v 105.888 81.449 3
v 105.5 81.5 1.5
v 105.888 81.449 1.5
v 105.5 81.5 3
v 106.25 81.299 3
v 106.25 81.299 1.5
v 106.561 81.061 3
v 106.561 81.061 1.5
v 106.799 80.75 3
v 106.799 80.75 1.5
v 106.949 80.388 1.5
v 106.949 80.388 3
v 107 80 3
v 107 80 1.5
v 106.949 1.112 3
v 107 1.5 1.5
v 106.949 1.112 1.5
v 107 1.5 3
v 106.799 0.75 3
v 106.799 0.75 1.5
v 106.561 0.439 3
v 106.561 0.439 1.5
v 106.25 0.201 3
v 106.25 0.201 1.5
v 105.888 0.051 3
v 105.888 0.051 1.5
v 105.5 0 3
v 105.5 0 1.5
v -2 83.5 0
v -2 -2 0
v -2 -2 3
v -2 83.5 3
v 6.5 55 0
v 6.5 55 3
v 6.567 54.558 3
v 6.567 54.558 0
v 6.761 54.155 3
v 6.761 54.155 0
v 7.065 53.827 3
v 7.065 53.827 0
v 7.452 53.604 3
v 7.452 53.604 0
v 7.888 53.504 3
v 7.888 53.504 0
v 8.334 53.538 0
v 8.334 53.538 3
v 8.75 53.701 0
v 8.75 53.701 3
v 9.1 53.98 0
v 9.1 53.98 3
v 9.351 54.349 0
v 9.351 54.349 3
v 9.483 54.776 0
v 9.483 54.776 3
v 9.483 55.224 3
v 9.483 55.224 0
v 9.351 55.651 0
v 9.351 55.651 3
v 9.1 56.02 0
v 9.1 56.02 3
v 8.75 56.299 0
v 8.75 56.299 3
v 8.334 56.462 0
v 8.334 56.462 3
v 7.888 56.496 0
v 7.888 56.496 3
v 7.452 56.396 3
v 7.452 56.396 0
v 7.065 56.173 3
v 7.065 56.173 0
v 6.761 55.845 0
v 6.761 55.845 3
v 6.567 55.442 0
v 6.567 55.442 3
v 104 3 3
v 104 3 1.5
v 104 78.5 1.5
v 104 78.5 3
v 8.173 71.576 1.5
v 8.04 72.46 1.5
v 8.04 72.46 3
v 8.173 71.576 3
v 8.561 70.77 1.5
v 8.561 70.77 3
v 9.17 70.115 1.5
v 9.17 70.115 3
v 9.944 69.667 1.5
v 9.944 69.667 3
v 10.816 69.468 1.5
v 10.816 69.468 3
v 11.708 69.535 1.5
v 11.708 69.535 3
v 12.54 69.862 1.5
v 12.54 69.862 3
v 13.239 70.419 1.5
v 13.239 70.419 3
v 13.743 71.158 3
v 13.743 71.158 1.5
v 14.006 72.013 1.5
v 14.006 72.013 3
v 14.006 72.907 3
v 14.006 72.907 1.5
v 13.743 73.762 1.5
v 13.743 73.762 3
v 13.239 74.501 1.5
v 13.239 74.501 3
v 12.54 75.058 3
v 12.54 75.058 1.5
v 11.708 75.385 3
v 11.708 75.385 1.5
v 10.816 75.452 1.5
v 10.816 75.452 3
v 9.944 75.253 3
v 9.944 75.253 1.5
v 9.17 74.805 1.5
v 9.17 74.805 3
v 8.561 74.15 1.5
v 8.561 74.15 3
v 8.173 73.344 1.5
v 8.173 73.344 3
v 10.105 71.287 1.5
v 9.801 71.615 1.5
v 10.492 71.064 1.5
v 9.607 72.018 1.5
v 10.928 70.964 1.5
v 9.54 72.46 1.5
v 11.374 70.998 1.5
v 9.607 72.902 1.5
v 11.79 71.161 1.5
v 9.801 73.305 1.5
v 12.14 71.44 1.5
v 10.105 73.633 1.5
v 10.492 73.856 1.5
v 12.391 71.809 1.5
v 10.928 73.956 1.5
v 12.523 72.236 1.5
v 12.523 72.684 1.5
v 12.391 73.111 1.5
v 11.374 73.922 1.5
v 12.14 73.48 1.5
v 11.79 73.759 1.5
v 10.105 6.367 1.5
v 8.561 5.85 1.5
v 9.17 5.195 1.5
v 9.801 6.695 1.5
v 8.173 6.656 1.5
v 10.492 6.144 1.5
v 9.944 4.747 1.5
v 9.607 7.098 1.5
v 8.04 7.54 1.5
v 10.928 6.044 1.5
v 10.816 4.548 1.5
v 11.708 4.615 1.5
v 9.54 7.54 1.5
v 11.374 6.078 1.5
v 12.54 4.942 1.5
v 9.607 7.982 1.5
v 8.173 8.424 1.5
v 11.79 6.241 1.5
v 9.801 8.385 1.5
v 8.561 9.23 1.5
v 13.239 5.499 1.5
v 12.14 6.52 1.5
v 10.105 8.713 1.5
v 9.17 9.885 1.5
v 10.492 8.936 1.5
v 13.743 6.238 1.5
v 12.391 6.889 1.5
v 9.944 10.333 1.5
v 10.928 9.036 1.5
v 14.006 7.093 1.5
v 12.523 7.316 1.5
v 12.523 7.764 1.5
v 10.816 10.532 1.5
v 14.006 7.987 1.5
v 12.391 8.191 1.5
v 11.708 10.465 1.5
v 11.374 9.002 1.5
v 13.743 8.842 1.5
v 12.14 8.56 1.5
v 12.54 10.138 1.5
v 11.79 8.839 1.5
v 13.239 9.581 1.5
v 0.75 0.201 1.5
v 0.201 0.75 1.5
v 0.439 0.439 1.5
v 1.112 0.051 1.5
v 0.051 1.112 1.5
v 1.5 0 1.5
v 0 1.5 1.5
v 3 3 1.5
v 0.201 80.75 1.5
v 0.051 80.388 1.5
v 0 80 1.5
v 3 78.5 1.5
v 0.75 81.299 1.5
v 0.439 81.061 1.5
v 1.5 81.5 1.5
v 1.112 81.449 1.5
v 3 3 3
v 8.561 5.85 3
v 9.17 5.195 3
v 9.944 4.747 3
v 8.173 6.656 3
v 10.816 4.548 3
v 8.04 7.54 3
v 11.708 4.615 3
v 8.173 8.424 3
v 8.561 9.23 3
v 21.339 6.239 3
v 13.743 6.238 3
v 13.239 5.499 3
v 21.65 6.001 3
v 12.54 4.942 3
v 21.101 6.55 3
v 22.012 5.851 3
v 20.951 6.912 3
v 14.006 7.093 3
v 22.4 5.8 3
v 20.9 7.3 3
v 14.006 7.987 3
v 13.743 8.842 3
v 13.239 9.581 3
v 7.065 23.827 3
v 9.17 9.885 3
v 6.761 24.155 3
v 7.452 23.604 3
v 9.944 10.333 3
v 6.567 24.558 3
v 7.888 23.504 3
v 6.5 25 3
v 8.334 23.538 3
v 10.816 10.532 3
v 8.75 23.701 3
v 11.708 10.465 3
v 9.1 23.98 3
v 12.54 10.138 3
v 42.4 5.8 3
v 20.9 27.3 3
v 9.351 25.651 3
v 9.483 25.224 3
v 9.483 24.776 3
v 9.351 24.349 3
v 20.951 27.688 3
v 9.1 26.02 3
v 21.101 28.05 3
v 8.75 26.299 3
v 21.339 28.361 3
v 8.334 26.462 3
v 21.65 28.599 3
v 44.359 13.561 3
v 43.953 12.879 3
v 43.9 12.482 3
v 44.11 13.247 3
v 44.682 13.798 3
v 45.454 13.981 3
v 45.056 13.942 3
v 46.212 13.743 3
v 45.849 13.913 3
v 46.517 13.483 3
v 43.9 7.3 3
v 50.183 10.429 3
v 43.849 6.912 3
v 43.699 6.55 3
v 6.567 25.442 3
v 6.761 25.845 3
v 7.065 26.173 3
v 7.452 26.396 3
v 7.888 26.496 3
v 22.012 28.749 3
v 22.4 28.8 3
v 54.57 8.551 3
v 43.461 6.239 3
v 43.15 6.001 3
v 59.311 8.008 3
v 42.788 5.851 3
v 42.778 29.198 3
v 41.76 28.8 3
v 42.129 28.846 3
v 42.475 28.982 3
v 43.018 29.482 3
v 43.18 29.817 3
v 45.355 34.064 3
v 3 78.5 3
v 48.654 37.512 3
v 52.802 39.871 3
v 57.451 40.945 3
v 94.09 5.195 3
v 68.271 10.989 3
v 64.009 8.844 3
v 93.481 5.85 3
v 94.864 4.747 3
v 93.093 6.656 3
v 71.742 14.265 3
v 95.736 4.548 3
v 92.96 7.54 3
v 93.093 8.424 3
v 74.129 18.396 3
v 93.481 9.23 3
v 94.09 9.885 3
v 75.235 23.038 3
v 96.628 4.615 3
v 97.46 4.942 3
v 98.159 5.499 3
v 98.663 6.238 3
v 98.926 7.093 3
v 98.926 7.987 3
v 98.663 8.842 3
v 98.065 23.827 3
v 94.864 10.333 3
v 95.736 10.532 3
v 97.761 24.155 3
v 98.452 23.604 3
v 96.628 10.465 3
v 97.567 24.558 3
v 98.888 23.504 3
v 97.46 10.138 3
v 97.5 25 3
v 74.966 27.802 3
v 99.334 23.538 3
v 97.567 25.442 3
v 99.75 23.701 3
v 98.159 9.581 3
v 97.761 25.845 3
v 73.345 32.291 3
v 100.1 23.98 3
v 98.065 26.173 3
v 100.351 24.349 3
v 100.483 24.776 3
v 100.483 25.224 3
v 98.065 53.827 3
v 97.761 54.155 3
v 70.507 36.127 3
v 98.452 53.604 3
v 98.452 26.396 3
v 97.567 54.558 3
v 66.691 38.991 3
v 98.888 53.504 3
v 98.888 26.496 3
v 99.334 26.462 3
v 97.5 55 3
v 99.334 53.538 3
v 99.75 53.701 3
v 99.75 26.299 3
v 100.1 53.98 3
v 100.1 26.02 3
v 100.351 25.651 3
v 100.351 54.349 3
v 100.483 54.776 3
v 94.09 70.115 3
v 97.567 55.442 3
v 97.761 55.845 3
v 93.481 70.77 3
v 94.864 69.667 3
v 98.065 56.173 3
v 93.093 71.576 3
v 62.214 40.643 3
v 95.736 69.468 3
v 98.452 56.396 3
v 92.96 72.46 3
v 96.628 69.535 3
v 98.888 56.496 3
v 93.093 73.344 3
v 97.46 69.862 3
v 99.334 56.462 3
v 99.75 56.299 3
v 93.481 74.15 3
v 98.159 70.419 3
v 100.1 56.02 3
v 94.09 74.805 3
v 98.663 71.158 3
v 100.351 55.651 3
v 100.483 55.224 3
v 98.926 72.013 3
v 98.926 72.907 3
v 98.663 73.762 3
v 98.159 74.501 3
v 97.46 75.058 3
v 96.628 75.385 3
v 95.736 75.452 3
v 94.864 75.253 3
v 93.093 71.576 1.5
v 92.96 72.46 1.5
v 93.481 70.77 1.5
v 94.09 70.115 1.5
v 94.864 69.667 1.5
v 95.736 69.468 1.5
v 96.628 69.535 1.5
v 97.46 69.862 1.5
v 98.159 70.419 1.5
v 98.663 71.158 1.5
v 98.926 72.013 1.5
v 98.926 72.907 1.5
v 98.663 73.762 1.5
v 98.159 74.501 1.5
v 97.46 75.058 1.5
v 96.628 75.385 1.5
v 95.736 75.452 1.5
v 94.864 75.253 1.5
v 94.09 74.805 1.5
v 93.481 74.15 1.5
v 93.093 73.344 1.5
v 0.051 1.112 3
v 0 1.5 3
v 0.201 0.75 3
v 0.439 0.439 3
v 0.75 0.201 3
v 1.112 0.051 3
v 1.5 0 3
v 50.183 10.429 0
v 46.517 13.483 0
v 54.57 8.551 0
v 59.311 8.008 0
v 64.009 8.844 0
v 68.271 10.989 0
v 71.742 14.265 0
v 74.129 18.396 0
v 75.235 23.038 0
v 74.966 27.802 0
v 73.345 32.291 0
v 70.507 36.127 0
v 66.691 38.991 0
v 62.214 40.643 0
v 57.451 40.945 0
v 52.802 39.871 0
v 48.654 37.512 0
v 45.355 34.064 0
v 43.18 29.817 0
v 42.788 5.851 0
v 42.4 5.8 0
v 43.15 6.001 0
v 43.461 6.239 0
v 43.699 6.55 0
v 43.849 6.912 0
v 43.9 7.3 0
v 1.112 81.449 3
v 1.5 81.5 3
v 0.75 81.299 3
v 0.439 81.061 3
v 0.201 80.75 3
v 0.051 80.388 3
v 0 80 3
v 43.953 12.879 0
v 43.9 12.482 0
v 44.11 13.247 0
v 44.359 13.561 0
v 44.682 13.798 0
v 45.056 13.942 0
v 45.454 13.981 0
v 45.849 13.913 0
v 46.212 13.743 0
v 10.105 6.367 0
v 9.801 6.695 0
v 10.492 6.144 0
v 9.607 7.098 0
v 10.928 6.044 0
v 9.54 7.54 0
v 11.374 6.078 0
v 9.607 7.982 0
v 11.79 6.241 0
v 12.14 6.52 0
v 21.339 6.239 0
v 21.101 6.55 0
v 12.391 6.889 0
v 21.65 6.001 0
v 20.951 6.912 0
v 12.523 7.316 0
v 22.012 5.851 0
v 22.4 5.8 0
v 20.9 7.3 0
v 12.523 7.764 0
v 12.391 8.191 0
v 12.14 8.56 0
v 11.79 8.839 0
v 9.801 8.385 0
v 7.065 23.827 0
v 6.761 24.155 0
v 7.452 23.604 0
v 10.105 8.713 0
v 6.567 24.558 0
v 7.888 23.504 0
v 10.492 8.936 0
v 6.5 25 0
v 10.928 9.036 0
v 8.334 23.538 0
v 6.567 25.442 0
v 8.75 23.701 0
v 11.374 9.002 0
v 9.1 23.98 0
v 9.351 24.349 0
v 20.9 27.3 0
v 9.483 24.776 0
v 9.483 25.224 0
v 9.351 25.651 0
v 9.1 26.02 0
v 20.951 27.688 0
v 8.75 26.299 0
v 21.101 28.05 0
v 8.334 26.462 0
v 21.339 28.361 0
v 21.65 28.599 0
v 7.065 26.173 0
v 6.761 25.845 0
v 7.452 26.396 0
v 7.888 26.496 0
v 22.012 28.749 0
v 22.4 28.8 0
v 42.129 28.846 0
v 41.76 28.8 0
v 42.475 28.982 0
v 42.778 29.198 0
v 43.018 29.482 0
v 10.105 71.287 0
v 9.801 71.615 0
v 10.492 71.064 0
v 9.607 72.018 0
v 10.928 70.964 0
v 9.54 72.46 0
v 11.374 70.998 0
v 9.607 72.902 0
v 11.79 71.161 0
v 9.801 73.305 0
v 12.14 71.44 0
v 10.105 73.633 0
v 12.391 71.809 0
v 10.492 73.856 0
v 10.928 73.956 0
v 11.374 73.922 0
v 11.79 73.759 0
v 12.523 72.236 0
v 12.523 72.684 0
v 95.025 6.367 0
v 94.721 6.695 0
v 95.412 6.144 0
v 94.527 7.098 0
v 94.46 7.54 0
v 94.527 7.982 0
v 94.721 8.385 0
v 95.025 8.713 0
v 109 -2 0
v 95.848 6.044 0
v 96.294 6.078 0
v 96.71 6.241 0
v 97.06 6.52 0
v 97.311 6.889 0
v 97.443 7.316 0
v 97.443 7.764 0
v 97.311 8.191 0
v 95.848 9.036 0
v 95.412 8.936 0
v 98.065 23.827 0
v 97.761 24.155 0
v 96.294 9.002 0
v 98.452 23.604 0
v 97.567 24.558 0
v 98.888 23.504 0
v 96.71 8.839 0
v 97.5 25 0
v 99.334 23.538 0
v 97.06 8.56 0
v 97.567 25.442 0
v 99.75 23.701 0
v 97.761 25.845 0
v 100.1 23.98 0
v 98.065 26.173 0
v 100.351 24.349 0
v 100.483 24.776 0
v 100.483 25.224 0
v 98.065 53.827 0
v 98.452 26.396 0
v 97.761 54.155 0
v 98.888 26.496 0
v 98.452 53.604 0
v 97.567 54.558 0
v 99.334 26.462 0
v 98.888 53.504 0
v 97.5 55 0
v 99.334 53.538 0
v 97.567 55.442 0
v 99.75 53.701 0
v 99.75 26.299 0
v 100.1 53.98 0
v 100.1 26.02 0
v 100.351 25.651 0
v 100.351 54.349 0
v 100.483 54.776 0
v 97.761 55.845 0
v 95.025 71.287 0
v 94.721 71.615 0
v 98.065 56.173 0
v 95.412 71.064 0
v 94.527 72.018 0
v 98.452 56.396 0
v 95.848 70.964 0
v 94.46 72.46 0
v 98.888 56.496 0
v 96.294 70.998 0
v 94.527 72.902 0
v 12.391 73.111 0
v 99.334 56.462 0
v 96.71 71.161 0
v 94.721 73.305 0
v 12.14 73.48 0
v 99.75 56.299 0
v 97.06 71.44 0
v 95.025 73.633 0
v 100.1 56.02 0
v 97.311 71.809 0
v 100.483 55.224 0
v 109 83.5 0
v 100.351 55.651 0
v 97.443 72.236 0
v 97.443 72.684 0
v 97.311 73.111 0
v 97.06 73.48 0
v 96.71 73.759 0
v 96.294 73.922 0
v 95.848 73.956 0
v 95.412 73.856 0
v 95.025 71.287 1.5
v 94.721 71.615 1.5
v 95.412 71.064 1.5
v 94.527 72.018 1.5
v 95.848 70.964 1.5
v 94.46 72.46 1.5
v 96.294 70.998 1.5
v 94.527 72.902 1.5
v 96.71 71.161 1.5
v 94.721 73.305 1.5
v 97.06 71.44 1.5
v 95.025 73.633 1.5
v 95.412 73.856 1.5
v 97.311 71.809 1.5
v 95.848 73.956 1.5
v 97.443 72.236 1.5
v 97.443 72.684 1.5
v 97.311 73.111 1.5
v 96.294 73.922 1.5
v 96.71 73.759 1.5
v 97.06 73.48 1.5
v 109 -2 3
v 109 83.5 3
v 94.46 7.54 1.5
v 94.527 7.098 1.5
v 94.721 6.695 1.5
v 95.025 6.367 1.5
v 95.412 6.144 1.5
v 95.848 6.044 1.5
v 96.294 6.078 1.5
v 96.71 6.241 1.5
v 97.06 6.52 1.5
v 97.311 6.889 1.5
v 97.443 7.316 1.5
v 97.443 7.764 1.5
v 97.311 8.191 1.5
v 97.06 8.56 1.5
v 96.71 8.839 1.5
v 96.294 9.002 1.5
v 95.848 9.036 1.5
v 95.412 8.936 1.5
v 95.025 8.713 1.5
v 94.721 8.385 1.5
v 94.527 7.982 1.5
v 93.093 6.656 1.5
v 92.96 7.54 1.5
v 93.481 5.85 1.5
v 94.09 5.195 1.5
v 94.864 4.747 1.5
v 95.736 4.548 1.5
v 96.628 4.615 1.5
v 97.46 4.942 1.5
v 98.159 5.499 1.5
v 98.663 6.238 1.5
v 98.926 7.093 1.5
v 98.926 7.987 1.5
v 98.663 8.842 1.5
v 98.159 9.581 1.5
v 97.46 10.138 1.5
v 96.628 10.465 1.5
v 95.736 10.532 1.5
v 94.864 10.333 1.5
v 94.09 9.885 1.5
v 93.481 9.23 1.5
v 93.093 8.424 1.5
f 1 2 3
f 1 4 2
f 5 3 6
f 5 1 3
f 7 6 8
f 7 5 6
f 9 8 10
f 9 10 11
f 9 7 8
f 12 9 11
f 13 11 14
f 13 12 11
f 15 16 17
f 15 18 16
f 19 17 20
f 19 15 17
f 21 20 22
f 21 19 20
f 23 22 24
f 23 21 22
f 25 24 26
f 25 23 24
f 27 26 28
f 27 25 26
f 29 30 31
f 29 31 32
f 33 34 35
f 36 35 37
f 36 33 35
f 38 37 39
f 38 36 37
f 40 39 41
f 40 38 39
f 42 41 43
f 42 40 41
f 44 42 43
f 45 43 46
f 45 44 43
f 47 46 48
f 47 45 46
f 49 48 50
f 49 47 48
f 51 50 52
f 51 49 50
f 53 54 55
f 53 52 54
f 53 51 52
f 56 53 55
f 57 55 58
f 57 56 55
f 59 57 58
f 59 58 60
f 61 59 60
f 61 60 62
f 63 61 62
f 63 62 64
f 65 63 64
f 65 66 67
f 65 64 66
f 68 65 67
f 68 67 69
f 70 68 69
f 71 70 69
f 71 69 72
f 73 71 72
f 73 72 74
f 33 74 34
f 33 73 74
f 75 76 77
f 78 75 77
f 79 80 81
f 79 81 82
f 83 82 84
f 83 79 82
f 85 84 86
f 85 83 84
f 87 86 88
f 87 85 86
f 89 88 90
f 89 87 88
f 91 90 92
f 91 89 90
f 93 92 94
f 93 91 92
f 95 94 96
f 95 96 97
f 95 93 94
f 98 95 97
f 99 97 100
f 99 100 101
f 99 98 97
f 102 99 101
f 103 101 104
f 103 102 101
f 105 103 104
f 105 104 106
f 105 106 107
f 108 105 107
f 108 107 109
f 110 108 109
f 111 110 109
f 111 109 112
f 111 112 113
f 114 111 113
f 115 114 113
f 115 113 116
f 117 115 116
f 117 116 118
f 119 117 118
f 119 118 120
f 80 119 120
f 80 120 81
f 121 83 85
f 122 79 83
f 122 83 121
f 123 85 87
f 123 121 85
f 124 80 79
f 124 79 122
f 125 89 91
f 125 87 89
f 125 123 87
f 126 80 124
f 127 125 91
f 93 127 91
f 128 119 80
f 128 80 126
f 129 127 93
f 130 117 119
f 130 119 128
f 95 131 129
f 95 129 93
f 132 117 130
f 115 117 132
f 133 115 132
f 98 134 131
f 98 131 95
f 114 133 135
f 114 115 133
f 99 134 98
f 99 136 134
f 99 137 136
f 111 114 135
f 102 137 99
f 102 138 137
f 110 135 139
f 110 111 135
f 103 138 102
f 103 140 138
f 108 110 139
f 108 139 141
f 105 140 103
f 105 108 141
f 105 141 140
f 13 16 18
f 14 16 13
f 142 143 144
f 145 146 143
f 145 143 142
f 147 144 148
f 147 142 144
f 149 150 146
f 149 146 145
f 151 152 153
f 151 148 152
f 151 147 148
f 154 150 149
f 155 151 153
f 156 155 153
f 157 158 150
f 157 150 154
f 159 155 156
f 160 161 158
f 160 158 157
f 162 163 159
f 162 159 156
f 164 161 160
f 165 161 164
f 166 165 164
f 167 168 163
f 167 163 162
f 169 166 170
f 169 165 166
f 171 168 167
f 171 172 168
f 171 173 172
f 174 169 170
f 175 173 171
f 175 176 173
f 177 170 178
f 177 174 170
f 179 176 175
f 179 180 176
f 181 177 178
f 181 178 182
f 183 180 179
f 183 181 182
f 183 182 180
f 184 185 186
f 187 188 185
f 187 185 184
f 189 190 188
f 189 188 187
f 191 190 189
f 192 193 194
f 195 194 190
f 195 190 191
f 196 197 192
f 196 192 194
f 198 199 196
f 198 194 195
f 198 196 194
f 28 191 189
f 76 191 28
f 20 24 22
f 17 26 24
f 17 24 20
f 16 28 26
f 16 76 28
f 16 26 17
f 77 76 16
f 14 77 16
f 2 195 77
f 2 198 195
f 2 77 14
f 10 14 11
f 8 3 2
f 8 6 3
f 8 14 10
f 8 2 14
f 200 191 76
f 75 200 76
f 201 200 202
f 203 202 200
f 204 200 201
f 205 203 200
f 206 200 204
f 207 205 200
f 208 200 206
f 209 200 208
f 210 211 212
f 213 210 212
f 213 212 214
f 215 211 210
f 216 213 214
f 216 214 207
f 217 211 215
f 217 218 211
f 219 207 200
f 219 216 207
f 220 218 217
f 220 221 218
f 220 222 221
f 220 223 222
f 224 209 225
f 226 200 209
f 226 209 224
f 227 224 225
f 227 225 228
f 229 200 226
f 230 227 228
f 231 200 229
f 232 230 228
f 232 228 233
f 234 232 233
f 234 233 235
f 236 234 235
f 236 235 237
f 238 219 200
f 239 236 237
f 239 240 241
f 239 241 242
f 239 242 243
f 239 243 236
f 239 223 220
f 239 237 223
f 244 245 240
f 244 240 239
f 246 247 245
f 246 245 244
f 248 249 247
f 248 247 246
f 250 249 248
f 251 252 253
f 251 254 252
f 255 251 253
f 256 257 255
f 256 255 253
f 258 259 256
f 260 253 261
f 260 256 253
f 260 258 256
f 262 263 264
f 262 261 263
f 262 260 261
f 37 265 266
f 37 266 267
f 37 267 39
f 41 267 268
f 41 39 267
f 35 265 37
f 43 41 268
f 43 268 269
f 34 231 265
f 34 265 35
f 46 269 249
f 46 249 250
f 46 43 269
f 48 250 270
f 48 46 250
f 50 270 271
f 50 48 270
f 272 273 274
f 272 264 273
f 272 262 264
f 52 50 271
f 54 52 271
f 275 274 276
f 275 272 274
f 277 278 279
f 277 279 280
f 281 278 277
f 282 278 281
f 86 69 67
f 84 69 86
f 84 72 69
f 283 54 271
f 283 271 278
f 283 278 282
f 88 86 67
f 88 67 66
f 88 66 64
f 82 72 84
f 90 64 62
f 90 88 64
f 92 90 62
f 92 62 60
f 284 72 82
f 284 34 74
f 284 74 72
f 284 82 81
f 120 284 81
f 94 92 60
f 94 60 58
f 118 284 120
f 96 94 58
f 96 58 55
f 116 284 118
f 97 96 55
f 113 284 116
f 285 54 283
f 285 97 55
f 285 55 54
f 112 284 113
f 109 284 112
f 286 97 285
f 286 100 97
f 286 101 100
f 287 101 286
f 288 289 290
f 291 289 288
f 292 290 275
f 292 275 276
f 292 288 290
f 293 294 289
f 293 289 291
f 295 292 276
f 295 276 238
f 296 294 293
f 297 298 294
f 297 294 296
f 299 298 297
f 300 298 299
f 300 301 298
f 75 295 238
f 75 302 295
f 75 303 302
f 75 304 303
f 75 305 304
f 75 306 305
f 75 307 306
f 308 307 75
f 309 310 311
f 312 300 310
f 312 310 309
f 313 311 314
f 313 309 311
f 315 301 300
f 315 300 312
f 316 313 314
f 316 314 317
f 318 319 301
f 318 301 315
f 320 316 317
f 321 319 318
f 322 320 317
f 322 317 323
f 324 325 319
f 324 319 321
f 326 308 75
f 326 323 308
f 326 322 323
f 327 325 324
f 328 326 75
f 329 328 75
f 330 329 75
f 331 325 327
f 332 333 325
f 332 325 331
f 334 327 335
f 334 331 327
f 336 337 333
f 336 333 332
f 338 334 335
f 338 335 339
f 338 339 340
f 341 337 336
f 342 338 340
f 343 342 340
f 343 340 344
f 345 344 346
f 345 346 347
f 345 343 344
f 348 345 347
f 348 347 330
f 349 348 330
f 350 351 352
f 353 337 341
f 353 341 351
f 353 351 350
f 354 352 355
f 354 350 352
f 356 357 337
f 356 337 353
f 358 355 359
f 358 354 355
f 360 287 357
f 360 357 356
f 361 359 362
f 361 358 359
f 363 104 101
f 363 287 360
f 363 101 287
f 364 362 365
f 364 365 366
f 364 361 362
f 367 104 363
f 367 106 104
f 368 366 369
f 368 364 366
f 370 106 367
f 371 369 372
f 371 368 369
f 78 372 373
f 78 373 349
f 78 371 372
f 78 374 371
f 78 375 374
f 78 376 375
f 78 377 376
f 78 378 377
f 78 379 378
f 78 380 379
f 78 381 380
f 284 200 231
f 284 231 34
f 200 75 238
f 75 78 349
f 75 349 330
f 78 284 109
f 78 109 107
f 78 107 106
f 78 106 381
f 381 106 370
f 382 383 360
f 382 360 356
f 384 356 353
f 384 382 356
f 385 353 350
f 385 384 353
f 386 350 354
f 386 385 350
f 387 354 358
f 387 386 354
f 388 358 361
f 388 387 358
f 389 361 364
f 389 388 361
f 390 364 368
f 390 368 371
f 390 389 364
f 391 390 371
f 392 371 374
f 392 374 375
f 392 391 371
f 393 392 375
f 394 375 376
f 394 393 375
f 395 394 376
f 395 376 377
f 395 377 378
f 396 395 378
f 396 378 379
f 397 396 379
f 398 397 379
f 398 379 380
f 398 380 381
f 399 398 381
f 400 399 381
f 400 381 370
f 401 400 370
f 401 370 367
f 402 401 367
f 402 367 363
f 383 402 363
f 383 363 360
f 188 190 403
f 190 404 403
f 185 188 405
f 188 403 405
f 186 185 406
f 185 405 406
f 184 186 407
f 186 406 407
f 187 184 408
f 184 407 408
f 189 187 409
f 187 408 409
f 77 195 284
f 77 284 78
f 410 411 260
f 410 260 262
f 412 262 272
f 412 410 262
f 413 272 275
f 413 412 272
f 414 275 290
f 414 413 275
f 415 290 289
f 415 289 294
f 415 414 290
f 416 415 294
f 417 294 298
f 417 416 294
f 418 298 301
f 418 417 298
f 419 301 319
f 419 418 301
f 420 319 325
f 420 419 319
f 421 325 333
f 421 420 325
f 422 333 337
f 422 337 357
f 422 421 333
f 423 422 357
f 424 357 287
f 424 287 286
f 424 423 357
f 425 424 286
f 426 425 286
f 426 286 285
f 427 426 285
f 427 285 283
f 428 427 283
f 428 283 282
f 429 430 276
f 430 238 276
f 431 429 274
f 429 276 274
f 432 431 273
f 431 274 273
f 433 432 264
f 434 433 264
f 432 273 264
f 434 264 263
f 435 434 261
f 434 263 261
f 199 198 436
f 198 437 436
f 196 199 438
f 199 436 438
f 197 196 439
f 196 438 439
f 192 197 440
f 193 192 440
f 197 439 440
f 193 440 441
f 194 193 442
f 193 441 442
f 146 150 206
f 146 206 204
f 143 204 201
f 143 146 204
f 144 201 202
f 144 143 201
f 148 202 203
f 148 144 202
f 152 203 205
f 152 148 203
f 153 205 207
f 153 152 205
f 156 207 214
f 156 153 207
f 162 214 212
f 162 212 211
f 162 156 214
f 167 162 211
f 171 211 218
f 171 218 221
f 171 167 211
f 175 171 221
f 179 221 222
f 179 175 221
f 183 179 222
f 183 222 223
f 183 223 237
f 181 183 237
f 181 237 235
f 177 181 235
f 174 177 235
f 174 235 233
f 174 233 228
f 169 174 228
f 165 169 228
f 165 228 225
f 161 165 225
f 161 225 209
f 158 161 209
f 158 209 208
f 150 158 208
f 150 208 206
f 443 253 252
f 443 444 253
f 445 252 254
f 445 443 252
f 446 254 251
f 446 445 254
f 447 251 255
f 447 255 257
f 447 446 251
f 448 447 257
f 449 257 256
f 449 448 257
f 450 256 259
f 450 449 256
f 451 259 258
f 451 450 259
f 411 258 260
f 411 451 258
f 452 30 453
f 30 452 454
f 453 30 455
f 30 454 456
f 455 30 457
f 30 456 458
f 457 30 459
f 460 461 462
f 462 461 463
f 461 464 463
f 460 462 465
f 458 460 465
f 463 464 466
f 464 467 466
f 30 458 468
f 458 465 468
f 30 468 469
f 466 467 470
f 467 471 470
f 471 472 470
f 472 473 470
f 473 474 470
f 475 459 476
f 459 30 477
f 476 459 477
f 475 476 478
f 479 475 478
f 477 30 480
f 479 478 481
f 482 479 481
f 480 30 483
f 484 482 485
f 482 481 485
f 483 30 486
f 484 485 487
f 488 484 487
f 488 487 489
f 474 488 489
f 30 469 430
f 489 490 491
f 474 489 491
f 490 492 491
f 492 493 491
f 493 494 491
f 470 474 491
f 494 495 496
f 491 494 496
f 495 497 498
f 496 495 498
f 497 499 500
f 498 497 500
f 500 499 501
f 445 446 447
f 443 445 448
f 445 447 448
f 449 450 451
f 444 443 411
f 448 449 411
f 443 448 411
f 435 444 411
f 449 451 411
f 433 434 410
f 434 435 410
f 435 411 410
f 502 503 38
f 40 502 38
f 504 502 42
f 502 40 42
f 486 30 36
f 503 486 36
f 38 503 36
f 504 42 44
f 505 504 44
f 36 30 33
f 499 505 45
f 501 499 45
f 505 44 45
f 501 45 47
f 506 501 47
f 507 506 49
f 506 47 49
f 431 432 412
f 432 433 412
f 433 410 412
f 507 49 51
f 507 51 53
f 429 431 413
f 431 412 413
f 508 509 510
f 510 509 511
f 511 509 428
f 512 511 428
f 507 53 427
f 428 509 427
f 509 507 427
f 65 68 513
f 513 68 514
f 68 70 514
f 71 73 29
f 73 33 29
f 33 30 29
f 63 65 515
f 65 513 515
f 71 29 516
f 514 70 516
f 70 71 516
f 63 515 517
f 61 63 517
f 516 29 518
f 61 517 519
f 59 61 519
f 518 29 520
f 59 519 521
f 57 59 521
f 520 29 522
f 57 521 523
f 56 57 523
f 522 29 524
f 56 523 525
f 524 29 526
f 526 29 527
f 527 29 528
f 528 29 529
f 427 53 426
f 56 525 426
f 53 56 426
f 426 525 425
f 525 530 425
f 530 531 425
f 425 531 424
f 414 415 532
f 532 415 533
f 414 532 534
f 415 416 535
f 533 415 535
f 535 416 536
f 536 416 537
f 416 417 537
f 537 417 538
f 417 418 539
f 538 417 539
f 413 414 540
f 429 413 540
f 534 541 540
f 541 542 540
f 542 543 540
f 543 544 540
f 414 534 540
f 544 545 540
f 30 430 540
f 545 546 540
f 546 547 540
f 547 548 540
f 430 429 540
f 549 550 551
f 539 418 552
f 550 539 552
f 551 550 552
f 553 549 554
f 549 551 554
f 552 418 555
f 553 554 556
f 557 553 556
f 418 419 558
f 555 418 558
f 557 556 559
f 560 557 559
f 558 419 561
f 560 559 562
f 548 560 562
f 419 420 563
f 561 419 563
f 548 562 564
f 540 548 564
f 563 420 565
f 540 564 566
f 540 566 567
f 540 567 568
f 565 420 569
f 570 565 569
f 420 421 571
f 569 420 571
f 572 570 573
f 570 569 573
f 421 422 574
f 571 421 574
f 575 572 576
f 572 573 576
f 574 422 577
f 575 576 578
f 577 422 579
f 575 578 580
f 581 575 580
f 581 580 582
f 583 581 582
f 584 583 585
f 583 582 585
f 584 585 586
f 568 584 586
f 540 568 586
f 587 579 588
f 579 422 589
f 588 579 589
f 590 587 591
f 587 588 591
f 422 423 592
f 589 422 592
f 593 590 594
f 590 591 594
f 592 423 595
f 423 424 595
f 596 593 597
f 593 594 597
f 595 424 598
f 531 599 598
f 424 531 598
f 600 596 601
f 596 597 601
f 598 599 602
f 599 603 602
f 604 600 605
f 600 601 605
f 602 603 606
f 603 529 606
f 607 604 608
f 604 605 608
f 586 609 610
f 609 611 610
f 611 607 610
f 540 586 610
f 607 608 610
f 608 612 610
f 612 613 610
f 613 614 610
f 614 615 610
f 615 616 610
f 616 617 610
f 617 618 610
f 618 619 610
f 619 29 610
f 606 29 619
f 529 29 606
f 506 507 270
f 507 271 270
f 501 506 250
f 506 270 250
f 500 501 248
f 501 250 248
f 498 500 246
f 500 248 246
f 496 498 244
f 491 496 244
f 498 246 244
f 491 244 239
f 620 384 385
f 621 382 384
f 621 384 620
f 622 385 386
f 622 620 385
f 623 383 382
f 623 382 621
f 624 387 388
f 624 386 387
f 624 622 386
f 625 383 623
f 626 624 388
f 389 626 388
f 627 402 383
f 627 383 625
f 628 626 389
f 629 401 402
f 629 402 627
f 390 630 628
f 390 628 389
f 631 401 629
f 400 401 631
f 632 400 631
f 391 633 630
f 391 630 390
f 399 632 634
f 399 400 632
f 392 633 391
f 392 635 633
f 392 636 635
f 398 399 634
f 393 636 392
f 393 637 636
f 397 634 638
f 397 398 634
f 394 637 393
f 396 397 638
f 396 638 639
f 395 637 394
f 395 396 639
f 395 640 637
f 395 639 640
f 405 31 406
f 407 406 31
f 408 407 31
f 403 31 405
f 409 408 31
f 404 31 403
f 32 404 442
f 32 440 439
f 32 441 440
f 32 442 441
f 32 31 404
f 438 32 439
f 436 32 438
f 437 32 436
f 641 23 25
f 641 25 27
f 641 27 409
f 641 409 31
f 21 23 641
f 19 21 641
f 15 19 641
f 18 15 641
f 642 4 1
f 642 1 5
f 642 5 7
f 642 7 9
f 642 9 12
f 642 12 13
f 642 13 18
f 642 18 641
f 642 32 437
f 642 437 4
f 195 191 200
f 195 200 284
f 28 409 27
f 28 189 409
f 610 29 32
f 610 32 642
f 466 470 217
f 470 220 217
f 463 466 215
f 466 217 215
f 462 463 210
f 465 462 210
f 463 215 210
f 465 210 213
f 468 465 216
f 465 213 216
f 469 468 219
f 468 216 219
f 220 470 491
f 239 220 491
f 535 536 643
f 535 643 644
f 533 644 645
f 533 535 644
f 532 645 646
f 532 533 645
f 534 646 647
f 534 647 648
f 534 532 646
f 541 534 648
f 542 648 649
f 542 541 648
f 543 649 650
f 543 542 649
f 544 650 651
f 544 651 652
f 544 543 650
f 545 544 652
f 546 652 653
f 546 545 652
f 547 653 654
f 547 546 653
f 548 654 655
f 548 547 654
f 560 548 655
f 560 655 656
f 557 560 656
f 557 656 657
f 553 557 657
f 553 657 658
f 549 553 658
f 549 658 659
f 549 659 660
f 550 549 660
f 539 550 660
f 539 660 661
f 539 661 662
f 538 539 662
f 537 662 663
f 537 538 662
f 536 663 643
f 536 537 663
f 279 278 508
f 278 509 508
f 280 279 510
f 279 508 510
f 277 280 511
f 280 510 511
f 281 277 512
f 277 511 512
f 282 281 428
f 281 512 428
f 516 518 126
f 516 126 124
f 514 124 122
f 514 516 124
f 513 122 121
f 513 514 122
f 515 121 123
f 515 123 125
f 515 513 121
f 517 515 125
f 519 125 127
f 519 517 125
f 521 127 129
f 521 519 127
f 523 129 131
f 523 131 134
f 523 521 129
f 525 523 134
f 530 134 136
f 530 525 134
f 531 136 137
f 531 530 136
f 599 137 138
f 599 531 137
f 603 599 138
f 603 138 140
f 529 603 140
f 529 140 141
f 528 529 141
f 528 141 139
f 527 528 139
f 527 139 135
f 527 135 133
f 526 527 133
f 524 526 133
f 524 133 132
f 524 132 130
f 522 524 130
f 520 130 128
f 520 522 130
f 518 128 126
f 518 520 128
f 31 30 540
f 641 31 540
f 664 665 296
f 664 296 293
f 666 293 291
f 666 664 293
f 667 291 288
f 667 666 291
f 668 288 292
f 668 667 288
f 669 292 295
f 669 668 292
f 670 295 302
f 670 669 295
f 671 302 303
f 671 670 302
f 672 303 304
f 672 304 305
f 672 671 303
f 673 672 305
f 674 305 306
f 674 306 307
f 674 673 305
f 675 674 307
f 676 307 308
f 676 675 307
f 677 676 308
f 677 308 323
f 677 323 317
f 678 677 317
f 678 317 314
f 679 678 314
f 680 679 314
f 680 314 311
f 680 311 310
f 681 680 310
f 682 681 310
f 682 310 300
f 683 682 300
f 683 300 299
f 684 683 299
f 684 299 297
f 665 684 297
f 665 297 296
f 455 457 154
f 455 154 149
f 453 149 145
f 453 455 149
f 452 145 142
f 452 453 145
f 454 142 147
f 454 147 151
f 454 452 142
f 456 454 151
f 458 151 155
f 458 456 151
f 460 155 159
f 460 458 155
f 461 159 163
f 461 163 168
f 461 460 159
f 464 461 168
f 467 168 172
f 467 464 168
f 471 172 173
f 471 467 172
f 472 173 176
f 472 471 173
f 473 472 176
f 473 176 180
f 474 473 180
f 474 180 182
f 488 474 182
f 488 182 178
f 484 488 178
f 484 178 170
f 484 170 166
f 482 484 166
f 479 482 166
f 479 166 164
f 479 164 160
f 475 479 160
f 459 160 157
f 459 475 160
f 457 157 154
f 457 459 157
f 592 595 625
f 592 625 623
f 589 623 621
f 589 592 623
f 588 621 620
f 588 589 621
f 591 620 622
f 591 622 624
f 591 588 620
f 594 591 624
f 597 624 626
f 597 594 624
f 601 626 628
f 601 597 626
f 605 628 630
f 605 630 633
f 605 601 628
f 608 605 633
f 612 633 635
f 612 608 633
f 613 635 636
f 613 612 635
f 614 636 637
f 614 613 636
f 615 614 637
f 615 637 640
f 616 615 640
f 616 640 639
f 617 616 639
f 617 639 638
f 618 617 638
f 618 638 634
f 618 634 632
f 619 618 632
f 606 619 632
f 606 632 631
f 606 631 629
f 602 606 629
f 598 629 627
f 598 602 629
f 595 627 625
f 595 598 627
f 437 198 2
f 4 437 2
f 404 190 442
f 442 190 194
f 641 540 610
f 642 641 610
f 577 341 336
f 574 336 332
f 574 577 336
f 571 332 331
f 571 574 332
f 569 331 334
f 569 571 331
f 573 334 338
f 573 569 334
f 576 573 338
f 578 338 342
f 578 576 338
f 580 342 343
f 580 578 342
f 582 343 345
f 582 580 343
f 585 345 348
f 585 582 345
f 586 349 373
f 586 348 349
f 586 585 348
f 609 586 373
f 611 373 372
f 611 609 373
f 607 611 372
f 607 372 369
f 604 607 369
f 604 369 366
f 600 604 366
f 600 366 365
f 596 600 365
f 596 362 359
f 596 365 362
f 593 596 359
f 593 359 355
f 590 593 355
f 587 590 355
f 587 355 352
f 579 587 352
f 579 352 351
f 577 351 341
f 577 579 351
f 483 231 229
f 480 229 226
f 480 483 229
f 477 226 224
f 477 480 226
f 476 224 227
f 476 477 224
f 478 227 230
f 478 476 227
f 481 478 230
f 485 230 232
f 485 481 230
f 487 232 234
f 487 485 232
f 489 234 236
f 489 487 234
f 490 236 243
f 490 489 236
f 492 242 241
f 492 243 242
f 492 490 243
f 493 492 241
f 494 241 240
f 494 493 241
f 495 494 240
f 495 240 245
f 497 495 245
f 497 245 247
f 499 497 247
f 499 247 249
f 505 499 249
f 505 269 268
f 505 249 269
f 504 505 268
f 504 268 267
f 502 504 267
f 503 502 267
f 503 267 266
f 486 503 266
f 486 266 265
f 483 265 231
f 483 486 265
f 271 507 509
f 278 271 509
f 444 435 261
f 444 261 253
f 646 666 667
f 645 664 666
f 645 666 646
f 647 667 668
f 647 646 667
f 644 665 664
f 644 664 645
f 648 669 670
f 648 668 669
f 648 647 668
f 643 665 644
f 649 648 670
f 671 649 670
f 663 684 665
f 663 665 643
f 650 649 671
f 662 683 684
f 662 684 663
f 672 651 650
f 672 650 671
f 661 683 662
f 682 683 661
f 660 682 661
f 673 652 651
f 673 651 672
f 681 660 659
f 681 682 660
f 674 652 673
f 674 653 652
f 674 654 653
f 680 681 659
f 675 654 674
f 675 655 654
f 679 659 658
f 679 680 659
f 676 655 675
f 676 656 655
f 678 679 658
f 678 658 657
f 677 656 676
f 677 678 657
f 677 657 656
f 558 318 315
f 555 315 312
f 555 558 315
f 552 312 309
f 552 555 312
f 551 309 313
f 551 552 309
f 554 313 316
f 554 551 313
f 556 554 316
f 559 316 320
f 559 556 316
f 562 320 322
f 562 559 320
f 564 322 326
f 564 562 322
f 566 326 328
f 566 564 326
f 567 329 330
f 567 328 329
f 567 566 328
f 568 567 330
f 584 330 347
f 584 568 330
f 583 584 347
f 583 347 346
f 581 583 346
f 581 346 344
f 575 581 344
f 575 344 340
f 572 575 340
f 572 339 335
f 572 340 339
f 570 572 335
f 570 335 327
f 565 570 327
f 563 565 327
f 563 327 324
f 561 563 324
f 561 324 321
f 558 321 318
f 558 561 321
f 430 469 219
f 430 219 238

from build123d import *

# Parameters (mm, degrees)
SKETCH_9_W                                     = 111
SKETCH_9_H                                     = 84
BOTTOM_BASE_1P5MM_FULL_111X84_DEPTH            = 1.5
SKETCH_10_W                                    = 101
SKETCH_10_H                                    = 74
SKETCH_10_R                                    = 3
BOTTOM_CENTER_FULL_THICKNESS_EXCEPT_STAN_DEPTH = 3
SKETCH_11_W                                    = 111
SKETCH_11_H                                    = 2
BOTTOM_OUTER_FRONT_OVERHANG_FULL_3MM_DEPTH     = 3
SKETCH_12_W                                    = 111
SKETCH_12_H                                    = 2
BOTTOM_OUTER_REAR_OVERHANG_FULL_3MM_DEPTH      = 3
SKETCH_13_W                                    = 2
SKETCH_13_H                                    = 80
BOTTOM_OUTER_LEFT_OVERHANG_FULL_3MM_DEPTH      = 3
SKETCH_14_W                                    = 2
SKETCH_14_H                                    = 80
BOTTOM_OUTER_RIGHT_OVERHANG_FULL_3MM_DEPTH     = 3
SKETCH_16_R                                    = 1.5
BOTTOM_M3_THROUGH_3MM_DEPTH                    = 1.5
SKETCH_18_R                                    = 16.5
BOTTOM_BATTERY_THROUGH_CLEARANCE_DEPTH         = 3
SKETCH_20_W                                    = 23
SKETCH_20_H                                    = 23
BOTTOM_BUZZER_THROUGH_CUT_DEPTH                = 3
SKETCH_21_R                                    = 1.5
BOTTOM_CENTER_RAIL_M3_THROUGH_3MM_DEPTH        = 6
BOTTOM_FILL_OLD_REAR_RABBET_1P5MM_START        = 1.5
SKETCH_22_W                                    = 101
SKETCH_22_H                                    = 1.5
BOTTOM_FILL_OLD_REAR_RABBET_1P5MM_DEPTH        = 1.5
SKETCH_23_W                                    = 107
SKETCH_23_H                                    = 2
BOTTOM_NEW_REAR_RABBET_1P5MM_DEEP_DEPTH        = 1.5
SKETCH_24_W                                    = 111
SKETCH_24_H                                    = 1.5
BOTTOM_REAR_OVERHANG_EXTENSION_1P5MM_DEPTH     = 3
TOOL_D3_R1P5_BUZZER_CORNERS_R                  = 1.5
BOTTOM_REAR_RABBET_WIDTH_FIX_3MM_START         = 1.5
SKETCH_25_W                                    = 107
SKETCH_25_H                                    = 0.5
BOTTOM_REAR_RABBET_WIDTH_FIX_3MM_DEPTH         = 1.5
TOOL_D3_R1P5_BOTTOM_RABBET_OUTER_CORNERS_R     = 1.5


with BuildPart() as part:
    # Sketch 9 → bottom_base_1p5mm_full_111x84 (new body)
    with BuildSketch(Plane.XY):
        with Locations((53.5, 40)):
            Rectangle(SKETCH_9_W, SKETCH_9_H)
    extrude(amount=BOTTOM_BASE_1P5MM_FULL_111X84_DEPTH)

    # Sketch 10 → bottom_center_full_thickness_except_stan (add)
    with BuildSketch(Plane.XY):
        with Locations((53.5, 40)):
            Rectangle(SKETCH_10_W, SKETCH_10_H)
        with Locations(Location((11.04, 7.54, 0), (0, 0, 180))):
            Circle(SKETCH_10_R, mode=Mode.SUBTRACT)
        with Locations(Location((95.96, 7.54, 0), (0, 0, 180))):
            Circle(SKETCH_10_R, mode=Mode.SUBTRACT)
        with Locations(Location((11.04, 72.46, 0), (0, 0, 180))):
            Circle(SKETCH_10_R, mode=Mode.SUBTRACT)
        with Locations(Location((95.96, 72.46, 0), (0, 0, 180))):
            Circle(SKETCH_10_R, mode=Mode.SUBTRACT)
    extrude(amount=BOTTOM_CENTER_FULL_THICKNESS_EXCEPT_STAN_DEPTH)

    # Sketch 11 → bottom_outer_front_overhang_full_3mm (add)
    with BuildSketch(Plane.XY):
        with Locations((53.5, -1)):
            Rectangle(SKETCH_11_W, SKETCH_11_H)
    extrude(amount=BOTTOM_OUTER_FRONT_OVERHANG_FULL_3MM_DEPTH)

    # Sketch 12 → bottom_outer_rear_overhang_full_3mm (add)
    with BuildSketch(Plane.XY):
        with Locations((53.5, 81)):
            Rectangle(SKETCH_12_W, SKETCH_12_H)
    extrude(amount=BOTTOM_OUTER_REAR_OVERHANG_FULL_3MM_DEPTH)

    # Sketch 13 → bottom_outer_left_overhang_full_3mm (add)
    with BuildSketch(Plane.XY):
        with Locations((-1, 40)):
            Rectangle(SKETCH_13_W, SKETCH_13_H)
    extrude(amount=BOTTOM_OUTER_LEFT_OVERHANG_FULL_3MM_DEPTH)

    # Sketch 14 → bottom_outer_right_overhang_full_3mm (add)
    with BuildSketch(Plane.XY):
        with Locations((108, 40)):
            Rectangle(SKETCH_14_W, SKETCH_14_H)
    extrude(amount=BOTTOM_OUTER_RIGHT_OVERHANG_FULL_3MM_DEPTH)

    # Sketch 16 → bottom_m3_through_3mm (cut)
    with BuildSketch(Plane.XY):
        with Locations(Location((11.04, 7.54, 0), (0, 0, 180))):
            Circle(SKETCH_16_R)
        with Locations(Location((95.96, 7.54, 0), (0, 0, 180))):
            Circle(SKETCH_16_R)
        with Locations(Location((11.04, 72.46, 0), (0, 0, 180))):
            Circle(SKETCH_16_R)
        with Locations(Location((95.96, 72.46, 0), (0, 0, 180))):
            Circle(SKETCH_16_R)
    extrude(amount=BOTTOM_M3_THROUGH_3MM_DEPTH, mode=Mode.SUBTRACT)

    # Sketch 18 → bottom_battery_through_clearance (cut)
    with BuildSketch(Plane.XY):
        with Locations(Location((58.8, 24.5, 0), (0, 0, 180))):
            Circle(SKETCH_18_R)
    extrude(amount=BOTTOM_BATTERY_THROUGH_CLEARANCE_DEPTH, mode=Mode.SUBTRACT)

    # Sketch 20 → bottom_buzzer_through_cut (cut)
    with BuildSketch(Plane.XY):
        with Locations((32.4, 17.3)):
            Rectangle(SKETCH_20_W, SKETCH_20_H)
    extrude(amount=BOTTOM_BUZZER_THROUGH_CUT_DEPTH, mode=Mode.SUBTRACT)

    # Sketch 21 → bottom_center_rail_m3_through_3mm (cut)
    with BuildSketch(Plane.XY):
        with Locations(Location((8, 25, 0), (0, 0, 180))):
            Circle(SKETCH_21_R)
        with Locations(Location((8, 55, 0), (0, 0, 180))):
            Circle(SKETCH_21_R)
        with Locations(Location((99, 25, 0), (0, 0, 180))):
            Circle(SKETCH_21_R)
        with Locations(Location((99, 55, 0), (0, 0, 180))):
            Circle(SKETCH_21_R)
    extrude(amount=BOTTOM_CENTER_RAIL_M3_THROUGH_3MM_DEPTH, mode=Mode.SUBTRACT)

    # Sketch 22 → bottom_fill_old_rear_rabbet_1p5mm (add)
    with BuildSketch(Plane.XY.offset(BOTTOM_FILL_OLD_REAR_RABBET_1P5MM_START)):
        with Locations((53.5, 77.75)):
            Rectangle(SKETCH_22_W, SKETCH_22_H)
    extrude(amount=BOTTOM_FILL_OLD_REAR_RABBET_1P5MM_DEPTH)

    # Sketch 23 → bottom_new_rear_rabbet_1p5mm_deep (cut)
    with BuildSketch(Plane.XY.offset(3)):
        with Locations((53.5, 81)):
            Rectangle(SKETCH_23_W, SKETCH_23_H)
    extrude(amount=-BOTTOM_NEW_REAR_RABBET_1P5MM_DEEP_DEPTH, mode=Mode.SUBTRACT)

    # Sketch 24 → bottom_rear_overhang_extension_1p5mm (add)
    with BuildSketch(Plane.XY):
        with Locations((53.5, 82.75)):
            Rectangle(SKETCH_24_W, SKETCH_24_H)
    extrude(amount=BOTTOM_REAR_OVERHANG_EXTENSION_1P5MM_DEPTH)

    # tool_D3_R1p5_buzzer_corners
    tool_d3_r1p5_buzzer_corners_edges = [part.edges().sort_by_distance(p)[0] for p in [
        (42.870153799, 28.8, 1.5),
        (43.9, 17.411981941, 1.5),
        (20.9, 28.8, 1.5),
        (20.9, 5.8, 1.5),
        (43.9, 5.8, 1.5),
    ]]
    fillet(tool_d3_r1p5_buzzer_corners_edges, radius=TOOL_D3_R1P5_BUZZER_CORNERS_R)

    # Sketch 25 → bottom_rear_rabbet_width_fix_3mm (add)
    with BuildSketch(Plane.XY.offset(BOTTOM_REAR_RABBET_WIDTH_FIX_3MM_START)):
        with Locations((53.5, 81.75)):
            Rectangle(SKETCH_25_W, SKETCH_25_H)
    extrude(amount=BOTTOM_REAR_RABBET_WIDTH_FIX_3MM_DEPTH)

    # tool_D3_R1p5_bottom_rabbet_outer_corners
    tool_d3_r1p5_bottom_rabbet_outer_corners_edges = [part.edges().sort_by_distance(p)[0] for p in [
        (107, 0, 2.25),
        (0, 81.5, 2.25),
        (107, 81.5, 2.25),
        (0, 0, 2.25),
    ]]
    fillet(tool_d3_r1p5_bottom_rabbet_outer_corners_edges, radius=TOOL_D3_R1P5_BOTTOM_RABBET_OUTER_CORNERS_R)


solid = part.part
